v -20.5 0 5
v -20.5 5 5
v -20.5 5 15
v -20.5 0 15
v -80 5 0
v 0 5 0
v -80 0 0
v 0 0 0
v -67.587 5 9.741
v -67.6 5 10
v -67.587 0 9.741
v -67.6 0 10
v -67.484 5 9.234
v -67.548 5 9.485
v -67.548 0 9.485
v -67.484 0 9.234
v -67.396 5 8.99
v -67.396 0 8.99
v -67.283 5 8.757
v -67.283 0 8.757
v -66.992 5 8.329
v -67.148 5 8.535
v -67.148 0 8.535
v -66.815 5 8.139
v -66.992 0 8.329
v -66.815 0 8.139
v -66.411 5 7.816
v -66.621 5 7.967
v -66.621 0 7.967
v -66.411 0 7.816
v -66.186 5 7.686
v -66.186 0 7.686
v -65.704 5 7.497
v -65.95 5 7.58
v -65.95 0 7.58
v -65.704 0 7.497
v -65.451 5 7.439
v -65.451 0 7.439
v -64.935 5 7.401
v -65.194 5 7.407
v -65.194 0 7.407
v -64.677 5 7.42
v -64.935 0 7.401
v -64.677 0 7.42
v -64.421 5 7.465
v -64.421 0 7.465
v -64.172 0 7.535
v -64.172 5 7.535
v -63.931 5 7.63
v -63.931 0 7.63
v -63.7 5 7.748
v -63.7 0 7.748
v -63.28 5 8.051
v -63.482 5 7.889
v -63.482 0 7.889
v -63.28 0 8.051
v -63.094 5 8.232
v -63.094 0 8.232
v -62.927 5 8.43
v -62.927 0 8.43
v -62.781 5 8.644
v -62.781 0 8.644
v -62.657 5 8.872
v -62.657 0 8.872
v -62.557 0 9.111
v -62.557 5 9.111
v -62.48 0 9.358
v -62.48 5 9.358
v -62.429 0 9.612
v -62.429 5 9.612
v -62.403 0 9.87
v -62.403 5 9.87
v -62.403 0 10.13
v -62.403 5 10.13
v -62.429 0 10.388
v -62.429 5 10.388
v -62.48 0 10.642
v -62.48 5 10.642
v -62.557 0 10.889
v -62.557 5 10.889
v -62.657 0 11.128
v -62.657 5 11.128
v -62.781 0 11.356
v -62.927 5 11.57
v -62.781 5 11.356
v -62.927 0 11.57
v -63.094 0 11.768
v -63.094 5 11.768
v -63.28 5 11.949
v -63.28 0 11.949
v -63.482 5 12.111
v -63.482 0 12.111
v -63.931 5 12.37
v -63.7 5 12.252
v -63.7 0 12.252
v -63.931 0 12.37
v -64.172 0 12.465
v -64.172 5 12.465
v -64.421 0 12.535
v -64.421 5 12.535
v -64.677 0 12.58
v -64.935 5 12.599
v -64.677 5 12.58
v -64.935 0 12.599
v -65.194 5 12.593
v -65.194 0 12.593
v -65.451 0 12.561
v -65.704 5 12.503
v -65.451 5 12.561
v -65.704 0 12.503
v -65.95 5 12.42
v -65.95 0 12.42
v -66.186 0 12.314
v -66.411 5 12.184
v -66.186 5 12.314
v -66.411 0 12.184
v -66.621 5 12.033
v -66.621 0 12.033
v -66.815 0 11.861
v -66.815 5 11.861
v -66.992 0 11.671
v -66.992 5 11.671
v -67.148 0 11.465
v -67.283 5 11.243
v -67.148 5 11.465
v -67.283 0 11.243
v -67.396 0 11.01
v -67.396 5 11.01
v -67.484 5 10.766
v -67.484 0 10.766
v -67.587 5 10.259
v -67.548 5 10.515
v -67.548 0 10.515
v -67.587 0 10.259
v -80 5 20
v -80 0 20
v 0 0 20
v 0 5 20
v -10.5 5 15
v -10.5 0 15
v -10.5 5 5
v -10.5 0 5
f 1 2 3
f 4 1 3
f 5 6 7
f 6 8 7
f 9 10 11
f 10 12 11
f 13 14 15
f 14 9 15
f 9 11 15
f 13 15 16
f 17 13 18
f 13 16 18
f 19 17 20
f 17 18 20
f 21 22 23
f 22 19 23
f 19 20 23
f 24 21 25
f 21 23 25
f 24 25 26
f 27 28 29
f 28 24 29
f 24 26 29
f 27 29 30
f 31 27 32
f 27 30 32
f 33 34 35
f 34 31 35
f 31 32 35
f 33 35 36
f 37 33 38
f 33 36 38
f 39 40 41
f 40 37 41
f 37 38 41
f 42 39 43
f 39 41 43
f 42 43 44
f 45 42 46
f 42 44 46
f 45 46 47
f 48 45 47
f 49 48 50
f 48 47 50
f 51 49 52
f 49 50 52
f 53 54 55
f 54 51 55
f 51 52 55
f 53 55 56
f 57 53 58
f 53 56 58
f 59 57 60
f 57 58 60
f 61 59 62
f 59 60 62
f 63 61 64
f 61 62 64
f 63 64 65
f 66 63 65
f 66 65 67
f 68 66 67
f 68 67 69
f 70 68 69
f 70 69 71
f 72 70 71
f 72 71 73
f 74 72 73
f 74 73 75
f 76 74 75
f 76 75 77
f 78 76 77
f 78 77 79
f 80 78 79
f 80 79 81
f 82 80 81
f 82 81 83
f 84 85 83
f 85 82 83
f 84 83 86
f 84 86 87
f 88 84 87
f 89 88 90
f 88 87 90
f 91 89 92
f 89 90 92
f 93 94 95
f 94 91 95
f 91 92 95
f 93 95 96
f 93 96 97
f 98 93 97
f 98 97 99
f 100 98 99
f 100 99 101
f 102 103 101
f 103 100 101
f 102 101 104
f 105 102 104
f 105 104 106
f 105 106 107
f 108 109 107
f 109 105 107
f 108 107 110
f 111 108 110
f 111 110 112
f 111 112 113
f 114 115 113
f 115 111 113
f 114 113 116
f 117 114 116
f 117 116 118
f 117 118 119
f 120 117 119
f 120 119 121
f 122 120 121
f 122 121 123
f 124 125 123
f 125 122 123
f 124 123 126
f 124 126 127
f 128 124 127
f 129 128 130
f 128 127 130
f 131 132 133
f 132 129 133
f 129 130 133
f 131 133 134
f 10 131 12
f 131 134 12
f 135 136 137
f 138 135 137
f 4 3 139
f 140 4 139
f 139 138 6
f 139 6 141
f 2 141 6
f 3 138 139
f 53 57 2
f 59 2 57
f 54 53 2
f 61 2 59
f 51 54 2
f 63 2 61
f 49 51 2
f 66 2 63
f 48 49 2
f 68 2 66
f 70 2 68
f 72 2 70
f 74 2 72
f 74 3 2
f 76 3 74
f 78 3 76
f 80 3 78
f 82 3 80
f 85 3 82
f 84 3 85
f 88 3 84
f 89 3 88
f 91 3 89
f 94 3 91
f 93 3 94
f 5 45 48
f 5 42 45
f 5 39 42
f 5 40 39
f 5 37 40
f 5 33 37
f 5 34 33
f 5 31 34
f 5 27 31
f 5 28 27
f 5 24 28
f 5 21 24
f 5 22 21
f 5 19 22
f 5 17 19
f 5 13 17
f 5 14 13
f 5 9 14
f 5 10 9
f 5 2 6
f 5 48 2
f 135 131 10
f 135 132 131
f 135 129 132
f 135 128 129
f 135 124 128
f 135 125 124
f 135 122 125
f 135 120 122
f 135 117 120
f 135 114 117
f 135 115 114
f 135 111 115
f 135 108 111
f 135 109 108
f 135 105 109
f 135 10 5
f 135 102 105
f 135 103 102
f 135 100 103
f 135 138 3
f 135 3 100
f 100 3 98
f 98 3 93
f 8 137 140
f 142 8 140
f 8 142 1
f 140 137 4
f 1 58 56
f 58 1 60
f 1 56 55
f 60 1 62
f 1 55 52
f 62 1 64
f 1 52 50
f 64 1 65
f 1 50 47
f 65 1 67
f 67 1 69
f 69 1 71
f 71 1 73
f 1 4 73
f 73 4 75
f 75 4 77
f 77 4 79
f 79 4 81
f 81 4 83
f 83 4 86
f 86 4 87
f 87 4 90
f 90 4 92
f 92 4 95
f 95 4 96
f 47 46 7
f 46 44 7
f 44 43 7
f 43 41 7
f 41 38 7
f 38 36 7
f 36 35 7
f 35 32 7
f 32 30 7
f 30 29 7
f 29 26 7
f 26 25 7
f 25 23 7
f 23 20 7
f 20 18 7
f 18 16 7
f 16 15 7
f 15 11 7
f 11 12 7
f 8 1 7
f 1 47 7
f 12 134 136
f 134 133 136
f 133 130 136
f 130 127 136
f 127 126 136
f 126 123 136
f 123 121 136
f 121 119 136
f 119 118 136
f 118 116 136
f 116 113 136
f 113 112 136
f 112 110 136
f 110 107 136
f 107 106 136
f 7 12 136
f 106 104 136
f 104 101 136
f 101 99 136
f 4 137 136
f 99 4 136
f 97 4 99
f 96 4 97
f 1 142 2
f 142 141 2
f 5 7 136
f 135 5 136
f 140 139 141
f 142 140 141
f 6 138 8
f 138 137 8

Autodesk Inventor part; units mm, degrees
ref_plane "YZ Plane" through (0, 0, 0) normal (1, 0, 0) x (0, 1, 0)
ref_plane "XZ Plane" through (0, 0, 0) normal (0, 1, 0) x (-1, 0, 0)
ref_plane "XY Plane" through (0, 0, 0) normal (0, 0, 1) x (1, 0, 0)
sketch "Sketch1" plane through (0, 0, 0) normal (0, 1, 0) x (-1, 0, 0)
  line L0 (0, 0) -> (80, 0)
  line L1 (80, 0) -> (80, 20)
  line L2 (80, 20) -> (0, 20)
  line L3 (0, 20) -> (0, 0)
  circle A0 centre (65, 10) radius 2.6
  dimension "d2" = 20
  dimension "d3" = 80
  dimension "d4" = 5.2
  dimension "d7" = 15
  dimension "d8" = 10
extrude "Extrusion2" add sketch "Sketch1" along normal blind 5
sketch "Sketch3" plane through (0, 5, 0) normal (0, 1, 0) x (1, 0, 0)
  circle A0 centre (-65, -10) radius 2.6 projected
  line L0 (0, 0) -> (-80, 0) projected
  line L1 (-80, 0) -> (-80, -20) projected
  line L2 (-80, -20) -> (0, -20) projected
  line L3 (0, -20) -> (0, 0) projected
  line L4 (-10.5, -5) -> (-20.5, -5)
  line L5 (-20.5, -5) -> (-20.5, -15)
  line L6 (-20.5, -15) -> (-10.5, -15)
  line L7 (-10.5, -15) -> (-10.5, -5)
  line L8 (-10.5, -5) -> (-20.5, -15) construction
  line L9 (-20.5, -5) -> (-10.5, -15) construction
  point P0 (-15.5, -10)
  dimension "d11" = 10
  dimension "d12" = 10
  dimension "d17" = 64.5
  dimension "d18" = 10
extrude "Extrusion3" cut sketch "Sketch3" against normal through all contours L7 L6 L5 L4
equation "\"d8\" = 0.5 * d2"
equation "\"d18\" = 0.5 * d2"
properties part number "slider_box" material "Wood (Birch)"
